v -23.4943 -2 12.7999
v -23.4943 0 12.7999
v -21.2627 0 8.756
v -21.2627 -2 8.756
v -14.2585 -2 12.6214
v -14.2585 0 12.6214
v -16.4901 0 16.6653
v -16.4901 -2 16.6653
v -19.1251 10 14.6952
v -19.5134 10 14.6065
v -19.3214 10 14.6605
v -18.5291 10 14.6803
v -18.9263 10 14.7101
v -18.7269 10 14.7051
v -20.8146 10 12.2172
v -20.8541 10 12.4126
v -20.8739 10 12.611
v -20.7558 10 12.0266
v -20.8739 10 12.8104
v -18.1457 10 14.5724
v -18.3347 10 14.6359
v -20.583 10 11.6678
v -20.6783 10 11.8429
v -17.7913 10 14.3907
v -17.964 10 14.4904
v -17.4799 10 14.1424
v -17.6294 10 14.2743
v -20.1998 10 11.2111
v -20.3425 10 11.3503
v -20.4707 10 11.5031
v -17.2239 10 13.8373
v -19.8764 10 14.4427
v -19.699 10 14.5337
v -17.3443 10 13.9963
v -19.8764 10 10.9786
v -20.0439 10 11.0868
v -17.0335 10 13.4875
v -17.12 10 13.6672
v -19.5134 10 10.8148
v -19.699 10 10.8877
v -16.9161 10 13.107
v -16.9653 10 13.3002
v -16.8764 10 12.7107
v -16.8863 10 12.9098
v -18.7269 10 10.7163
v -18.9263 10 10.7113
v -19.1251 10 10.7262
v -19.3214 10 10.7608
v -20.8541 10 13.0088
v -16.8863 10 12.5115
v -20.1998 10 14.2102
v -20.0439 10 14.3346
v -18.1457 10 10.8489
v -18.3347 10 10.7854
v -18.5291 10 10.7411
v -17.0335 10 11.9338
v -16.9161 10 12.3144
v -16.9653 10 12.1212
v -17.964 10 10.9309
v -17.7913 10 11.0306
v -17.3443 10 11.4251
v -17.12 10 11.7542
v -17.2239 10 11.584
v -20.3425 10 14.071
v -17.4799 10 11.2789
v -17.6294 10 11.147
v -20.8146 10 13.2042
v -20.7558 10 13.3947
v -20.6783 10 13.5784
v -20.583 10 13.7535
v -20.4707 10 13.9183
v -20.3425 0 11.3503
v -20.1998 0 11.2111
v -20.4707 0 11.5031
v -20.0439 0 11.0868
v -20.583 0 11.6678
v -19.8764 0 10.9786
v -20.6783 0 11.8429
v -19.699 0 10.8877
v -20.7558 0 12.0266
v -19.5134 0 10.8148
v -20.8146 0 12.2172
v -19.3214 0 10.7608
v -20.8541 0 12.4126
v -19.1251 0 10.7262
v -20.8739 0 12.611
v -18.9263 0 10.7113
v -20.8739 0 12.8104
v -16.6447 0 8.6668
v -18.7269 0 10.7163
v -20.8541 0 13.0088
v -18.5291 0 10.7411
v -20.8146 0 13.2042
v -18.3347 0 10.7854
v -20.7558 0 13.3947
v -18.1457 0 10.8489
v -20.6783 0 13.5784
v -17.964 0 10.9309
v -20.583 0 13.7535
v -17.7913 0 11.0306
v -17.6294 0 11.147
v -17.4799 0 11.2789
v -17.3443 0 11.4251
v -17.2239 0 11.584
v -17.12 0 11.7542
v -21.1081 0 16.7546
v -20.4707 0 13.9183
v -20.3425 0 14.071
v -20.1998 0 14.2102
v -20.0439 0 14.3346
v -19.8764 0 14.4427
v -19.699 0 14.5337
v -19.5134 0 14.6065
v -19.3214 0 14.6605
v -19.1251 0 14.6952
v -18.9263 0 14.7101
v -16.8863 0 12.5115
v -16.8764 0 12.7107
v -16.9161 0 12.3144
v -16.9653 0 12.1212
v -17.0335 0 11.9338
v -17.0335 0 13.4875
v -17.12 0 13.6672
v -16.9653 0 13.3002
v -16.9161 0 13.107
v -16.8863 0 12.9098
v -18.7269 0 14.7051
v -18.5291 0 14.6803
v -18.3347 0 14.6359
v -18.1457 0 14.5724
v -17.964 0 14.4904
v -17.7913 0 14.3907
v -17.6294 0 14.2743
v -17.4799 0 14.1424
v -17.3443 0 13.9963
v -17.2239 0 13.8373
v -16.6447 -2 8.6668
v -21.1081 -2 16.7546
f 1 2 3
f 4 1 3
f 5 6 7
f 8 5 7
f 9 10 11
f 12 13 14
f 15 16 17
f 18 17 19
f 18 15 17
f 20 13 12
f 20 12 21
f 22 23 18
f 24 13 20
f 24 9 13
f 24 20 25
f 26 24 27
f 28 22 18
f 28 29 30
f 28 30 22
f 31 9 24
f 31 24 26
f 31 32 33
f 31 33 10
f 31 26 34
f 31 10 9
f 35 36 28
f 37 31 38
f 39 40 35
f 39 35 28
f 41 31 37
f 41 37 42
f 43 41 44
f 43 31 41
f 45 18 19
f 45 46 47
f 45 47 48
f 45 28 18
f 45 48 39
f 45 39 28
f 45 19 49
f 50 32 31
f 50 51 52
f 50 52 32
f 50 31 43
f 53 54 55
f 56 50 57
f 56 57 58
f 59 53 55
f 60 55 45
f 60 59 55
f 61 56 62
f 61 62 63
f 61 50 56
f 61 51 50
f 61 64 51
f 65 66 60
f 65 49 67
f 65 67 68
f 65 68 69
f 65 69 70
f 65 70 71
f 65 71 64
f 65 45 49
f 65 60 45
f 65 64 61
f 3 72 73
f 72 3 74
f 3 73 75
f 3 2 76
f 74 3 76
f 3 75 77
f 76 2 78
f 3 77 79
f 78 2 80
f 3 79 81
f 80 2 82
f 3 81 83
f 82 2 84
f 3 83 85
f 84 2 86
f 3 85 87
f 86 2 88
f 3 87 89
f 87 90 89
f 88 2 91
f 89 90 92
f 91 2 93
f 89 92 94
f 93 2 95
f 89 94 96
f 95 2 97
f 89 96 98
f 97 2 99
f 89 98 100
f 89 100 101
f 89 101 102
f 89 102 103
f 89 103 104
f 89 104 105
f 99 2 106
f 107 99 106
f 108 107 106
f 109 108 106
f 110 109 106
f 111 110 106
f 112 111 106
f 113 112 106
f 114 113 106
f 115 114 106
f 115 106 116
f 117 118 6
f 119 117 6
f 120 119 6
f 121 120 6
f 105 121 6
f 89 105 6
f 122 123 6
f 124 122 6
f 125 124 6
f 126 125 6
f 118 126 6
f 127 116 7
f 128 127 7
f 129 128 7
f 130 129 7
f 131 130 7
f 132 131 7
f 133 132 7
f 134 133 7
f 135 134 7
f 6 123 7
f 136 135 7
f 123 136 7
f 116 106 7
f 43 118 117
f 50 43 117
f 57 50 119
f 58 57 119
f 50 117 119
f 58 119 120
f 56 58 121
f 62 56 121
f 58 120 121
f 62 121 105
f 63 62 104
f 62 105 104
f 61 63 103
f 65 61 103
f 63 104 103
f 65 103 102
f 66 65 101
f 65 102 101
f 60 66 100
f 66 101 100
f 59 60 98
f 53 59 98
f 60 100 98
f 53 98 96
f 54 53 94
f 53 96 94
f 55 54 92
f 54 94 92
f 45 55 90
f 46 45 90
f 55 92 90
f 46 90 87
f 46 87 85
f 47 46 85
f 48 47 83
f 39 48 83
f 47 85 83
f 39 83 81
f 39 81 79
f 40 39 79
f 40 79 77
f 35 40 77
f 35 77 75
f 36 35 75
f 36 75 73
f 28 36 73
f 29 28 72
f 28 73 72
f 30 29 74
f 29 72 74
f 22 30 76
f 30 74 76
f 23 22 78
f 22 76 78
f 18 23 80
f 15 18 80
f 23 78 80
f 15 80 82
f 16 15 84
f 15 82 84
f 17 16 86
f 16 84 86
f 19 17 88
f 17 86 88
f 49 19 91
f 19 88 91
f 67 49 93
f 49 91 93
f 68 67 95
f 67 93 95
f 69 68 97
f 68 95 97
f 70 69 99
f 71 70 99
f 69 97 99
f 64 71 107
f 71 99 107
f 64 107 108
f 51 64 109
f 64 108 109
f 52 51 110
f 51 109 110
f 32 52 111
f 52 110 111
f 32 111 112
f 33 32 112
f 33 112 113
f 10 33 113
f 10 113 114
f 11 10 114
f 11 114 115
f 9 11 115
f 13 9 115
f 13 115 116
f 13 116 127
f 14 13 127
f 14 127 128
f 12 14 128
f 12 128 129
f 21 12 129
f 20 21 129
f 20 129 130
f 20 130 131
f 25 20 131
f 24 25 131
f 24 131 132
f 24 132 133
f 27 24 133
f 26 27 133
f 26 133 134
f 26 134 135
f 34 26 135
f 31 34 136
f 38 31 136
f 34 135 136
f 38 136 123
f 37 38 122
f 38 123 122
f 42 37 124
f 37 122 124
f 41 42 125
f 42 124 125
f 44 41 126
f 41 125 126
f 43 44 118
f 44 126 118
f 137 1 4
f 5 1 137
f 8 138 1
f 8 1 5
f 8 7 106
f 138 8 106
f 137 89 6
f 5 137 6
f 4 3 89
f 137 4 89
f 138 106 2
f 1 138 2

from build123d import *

# Parameters (mm, degrees)
SKETCH1_R           = 2
BOSS_EXTRUDE1_DEPTH = 10
BOSS_EXTRUDE4_DEPTH = 2


with BuildPart() as part:
    # Sketch1 → Boss-Extrude1 (new body)
    with BuildSketch(Plane(origin=(0, 0, 0), x_dir=(1, 0, 0), z_dir=(0, 1, 0))):
        with Locations((-18.876405997, -12.710678642)):
            Circle(SKETCH1_R)
    extrude(amount=BOSS_EXTRUDE1_DEPTH)

    # Sketch4 → Boss-Extrude4 (add)
    with BuildSketch(Plane.XZ):
        Polygon((-16.490145939, 16.665308368), (-21.108085773, 16.754555336), (-23.494345831, 12.79992561), (-21.262666056, 8.756048917), (-16.644726221, 8.666801949), (-14.258466163, 12.621431674), align=None)
    extrude(amount=BOSS_EXTRUDE4_DEPTH)


solid = part.part
